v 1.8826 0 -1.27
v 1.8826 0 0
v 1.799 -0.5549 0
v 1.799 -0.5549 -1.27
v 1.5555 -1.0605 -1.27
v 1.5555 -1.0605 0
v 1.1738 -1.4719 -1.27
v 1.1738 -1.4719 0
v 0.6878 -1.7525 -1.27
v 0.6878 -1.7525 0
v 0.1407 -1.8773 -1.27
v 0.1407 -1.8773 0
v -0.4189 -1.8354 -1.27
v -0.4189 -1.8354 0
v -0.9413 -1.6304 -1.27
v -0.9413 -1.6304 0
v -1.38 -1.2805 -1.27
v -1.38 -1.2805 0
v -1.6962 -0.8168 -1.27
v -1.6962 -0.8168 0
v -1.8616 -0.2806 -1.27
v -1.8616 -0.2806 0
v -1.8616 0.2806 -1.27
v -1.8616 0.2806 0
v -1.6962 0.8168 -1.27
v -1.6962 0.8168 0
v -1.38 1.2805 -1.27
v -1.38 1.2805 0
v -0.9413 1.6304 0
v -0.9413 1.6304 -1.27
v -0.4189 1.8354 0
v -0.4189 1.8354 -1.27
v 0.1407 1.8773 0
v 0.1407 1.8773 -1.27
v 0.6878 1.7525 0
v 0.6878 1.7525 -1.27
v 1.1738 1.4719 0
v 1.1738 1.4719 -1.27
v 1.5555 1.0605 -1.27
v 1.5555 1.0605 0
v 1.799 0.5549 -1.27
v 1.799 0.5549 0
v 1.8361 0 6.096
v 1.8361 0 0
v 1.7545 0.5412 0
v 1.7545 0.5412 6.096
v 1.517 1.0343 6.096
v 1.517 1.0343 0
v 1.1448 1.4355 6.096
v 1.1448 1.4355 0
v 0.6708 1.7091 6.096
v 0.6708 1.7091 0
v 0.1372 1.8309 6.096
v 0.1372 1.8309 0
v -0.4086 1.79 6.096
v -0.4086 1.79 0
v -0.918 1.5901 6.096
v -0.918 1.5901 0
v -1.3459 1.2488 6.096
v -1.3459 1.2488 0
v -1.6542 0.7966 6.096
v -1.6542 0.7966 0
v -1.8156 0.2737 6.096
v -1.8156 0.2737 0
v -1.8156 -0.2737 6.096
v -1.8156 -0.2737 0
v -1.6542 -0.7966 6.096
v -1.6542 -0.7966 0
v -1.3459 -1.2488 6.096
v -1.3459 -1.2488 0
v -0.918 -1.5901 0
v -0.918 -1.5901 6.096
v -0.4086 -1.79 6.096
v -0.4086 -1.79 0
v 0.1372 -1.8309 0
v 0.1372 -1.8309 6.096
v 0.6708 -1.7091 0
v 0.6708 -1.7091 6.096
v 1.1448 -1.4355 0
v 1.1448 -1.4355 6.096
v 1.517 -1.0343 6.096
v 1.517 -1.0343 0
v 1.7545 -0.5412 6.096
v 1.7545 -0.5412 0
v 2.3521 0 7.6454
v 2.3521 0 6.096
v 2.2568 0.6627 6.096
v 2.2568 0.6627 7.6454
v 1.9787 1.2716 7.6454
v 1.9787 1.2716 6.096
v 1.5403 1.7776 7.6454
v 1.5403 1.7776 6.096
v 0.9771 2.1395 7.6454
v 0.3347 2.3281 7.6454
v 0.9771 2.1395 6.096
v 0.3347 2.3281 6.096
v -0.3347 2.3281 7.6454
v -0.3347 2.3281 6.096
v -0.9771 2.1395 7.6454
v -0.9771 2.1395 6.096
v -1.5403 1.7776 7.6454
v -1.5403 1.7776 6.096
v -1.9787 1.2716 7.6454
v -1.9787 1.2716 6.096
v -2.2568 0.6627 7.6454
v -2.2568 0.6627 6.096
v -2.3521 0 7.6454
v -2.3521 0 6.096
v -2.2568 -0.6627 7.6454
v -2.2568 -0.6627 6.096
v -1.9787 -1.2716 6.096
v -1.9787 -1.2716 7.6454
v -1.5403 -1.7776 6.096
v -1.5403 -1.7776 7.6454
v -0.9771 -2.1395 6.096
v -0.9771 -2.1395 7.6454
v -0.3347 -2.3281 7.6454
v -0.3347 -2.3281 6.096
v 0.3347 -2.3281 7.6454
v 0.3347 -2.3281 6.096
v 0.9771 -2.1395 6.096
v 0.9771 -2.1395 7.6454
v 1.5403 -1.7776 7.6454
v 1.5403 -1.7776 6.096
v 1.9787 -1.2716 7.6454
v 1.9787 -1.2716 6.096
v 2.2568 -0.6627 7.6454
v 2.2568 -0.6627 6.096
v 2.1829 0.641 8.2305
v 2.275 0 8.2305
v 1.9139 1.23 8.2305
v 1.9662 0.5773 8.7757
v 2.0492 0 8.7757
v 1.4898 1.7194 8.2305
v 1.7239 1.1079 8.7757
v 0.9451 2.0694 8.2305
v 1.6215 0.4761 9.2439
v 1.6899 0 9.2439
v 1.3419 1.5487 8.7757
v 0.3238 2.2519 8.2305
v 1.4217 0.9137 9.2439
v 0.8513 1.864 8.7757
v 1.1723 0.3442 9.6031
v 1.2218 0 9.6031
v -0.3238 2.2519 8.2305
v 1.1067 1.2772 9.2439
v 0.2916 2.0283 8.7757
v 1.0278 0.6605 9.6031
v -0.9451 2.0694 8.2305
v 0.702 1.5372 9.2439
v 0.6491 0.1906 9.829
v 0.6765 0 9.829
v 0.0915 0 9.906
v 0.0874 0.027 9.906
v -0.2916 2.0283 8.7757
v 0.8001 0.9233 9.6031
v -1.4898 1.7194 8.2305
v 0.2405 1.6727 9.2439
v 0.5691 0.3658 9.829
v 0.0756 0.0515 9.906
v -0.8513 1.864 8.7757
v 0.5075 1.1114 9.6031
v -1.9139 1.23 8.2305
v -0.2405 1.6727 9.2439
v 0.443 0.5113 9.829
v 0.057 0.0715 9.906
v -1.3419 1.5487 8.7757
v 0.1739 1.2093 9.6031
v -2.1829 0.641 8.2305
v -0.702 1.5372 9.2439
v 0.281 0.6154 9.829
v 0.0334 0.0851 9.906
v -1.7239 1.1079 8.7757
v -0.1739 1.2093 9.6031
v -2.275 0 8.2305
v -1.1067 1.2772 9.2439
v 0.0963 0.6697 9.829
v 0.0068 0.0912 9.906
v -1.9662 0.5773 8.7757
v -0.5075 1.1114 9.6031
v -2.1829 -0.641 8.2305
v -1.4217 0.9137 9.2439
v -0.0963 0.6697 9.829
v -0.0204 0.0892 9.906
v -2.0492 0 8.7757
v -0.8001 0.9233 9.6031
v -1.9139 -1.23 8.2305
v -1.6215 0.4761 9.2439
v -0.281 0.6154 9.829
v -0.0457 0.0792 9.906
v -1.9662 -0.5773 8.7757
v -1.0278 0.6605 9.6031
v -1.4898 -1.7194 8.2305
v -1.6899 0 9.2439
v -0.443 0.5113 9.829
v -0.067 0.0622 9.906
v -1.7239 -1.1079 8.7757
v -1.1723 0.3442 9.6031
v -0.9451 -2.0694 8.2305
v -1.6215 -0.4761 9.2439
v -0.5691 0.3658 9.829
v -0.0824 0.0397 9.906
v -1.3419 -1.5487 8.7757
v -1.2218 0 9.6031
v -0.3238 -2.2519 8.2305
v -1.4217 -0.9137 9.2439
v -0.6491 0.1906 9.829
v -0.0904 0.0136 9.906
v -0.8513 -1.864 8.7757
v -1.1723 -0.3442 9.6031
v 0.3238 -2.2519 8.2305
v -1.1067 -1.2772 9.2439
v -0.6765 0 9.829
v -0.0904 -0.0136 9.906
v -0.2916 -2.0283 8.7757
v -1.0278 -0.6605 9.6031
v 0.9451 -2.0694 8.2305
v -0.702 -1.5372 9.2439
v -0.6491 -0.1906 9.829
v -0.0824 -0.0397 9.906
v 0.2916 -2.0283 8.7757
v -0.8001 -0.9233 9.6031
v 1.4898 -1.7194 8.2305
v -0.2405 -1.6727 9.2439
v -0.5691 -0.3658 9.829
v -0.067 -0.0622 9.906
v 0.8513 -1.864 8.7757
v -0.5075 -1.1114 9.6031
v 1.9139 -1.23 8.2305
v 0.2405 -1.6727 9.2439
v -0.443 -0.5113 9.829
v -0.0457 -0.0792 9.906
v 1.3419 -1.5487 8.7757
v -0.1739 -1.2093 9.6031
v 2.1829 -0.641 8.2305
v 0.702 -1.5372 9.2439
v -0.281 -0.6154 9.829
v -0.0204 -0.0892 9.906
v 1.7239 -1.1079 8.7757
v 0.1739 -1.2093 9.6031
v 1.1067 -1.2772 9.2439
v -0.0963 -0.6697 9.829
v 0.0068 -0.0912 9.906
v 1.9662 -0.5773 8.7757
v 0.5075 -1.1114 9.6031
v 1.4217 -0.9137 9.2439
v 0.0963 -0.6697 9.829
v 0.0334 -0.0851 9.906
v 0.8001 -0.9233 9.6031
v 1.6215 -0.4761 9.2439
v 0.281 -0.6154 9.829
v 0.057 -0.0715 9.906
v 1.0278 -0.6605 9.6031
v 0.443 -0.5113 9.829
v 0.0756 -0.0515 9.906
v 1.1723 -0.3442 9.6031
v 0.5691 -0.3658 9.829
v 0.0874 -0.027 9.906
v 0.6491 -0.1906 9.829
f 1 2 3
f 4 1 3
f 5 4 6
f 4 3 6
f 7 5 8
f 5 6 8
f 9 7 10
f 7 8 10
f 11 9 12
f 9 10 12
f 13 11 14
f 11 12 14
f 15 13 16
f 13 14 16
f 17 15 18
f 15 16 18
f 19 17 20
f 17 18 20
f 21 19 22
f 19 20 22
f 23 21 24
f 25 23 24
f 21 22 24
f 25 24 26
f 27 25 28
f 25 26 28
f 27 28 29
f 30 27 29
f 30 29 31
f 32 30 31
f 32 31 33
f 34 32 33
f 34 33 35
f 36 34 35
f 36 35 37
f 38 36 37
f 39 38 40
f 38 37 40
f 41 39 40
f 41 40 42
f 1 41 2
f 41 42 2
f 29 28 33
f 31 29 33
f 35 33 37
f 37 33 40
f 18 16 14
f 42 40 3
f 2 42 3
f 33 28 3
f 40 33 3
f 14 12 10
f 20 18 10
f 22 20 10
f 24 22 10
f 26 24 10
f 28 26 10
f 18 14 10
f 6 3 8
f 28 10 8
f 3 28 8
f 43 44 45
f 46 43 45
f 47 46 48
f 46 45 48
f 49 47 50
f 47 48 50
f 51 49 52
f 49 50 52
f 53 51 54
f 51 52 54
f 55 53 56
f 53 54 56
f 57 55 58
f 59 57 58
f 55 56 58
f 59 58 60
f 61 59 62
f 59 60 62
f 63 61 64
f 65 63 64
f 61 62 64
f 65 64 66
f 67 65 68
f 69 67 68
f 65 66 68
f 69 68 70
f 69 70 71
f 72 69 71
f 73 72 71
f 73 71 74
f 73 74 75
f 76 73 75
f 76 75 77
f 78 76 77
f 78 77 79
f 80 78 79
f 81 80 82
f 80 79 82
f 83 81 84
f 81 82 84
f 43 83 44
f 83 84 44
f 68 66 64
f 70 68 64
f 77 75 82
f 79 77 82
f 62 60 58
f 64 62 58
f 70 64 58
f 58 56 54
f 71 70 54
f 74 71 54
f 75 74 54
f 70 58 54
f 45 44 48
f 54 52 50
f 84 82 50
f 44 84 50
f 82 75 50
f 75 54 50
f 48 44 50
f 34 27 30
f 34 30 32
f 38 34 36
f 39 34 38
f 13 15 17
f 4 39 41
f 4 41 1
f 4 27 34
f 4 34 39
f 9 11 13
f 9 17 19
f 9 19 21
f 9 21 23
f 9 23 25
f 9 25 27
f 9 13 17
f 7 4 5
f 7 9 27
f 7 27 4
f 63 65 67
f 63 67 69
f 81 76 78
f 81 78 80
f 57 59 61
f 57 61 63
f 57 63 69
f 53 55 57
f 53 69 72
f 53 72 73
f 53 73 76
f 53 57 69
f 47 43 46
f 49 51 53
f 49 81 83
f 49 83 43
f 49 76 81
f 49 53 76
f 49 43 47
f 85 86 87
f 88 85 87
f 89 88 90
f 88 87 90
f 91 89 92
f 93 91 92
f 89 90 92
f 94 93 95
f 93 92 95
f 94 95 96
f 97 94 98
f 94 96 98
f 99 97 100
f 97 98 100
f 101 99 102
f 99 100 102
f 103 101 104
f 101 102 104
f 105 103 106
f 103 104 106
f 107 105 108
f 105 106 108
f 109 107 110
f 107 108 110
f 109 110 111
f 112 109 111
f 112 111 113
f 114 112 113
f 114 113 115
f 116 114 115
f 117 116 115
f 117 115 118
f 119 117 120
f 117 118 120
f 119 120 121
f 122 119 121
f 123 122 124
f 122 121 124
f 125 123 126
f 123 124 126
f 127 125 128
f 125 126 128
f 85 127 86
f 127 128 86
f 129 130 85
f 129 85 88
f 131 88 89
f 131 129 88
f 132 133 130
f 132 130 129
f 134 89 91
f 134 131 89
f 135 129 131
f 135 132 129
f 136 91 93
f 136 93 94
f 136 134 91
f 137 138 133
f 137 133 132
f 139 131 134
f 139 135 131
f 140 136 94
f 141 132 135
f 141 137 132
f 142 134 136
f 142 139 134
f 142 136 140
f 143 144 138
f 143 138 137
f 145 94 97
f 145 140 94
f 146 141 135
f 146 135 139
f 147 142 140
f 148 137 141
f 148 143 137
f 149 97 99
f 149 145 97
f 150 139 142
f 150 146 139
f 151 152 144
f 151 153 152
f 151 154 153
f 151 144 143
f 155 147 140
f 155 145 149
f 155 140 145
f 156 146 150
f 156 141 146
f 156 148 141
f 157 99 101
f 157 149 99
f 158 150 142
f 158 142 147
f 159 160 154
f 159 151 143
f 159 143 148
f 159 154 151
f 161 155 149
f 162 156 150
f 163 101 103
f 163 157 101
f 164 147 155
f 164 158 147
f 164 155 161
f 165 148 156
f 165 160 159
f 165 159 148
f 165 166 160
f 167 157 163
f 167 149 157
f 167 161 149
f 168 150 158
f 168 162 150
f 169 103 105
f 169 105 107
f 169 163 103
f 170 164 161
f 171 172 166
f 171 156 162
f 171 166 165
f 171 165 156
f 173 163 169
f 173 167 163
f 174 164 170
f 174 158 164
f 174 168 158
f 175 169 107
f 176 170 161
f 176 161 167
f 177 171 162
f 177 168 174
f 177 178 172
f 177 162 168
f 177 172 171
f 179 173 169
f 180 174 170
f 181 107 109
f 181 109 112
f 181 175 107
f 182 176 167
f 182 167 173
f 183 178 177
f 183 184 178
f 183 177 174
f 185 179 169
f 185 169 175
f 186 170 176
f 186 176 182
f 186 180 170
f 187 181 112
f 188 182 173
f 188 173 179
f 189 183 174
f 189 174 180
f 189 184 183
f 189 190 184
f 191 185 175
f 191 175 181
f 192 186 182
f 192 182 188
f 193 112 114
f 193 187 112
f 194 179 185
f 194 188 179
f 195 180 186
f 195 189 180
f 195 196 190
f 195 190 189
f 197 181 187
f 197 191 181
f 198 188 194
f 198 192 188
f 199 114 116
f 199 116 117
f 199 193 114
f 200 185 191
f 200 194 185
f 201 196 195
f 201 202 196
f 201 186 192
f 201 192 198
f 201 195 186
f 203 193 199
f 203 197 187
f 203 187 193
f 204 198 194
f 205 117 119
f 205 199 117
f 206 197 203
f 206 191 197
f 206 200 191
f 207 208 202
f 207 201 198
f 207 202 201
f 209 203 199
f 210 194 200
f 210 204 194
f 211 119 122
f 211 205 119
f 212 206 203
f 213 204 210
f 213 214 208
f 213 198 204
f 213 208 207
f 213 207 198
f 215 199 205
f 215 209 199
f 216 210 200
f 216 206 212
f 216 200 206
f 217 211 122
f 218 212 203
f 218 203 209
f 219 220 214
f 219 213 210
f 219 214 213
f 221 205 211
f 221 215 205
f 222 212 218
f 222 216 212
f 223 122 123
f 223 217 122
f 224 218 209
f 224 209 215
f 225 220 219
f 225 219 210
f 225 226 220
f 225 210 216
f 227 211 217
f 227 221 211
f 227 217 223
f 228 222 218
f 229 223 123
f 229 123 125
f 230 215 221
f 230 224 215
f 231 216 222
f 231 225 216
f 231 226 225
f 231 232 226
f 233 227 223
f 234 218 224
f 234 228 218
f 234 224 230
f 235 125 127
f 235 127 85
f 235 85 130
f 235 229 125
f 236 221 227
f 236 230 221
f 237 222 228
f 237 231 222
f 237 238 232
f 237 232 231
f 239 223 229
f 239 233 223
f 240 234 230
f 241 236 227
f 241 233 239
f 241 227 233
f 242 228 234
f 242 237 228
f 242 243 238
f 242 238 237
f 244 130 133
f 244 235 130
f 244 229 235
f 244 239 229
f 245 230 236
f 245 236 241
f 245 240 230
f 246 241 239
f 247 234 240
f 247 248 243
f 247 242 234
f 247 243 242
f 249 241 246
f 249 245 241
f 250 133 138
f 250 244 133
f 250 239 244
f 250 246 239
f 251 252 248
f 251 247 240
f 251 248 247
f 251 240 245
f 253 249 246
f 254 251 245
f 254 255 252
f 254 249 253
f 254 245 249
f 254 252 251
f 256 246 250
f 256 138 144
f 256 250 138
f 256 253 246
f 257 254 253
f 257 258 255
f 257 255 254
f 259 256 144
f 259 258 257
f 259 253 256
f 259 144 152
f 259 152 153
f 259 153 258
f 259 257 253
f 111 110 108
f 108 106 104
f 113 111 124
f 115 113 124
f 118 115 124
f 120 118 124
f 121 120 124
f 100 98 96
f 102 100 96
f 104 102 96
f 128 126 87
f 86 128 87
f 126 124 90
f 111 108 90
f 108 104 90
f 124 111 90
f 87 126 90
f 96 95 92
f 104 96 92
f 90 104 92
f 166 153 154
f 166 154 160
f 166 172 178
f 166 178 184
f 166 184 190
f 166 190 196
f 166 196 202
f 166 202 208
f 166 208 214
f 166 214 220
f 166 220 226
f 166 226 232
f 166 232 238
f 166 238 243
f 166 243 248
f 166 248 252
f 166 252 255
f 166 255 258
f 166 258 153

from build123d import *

# Parameters (mm, degrees)
F0_R     = 1.8360694956
F1_DEPTH = 6.096
F2_R     = 2.3520596952
F2_R_2   = 1.8360694956
F3_DEPTH = 3.81
F4_R     = 2.2606
F5_R     = 1.8826071484
F5_R_2   = 1.8360694956
F6_DEPTH = 1.27


with BuildPart() as f1:
    # F0 (on Top) → F1 (new body)
    with BuildSketch(Plane.XY):
        Circle(F0_R)
    extrude(amount=F1_DEPTH)


with BuildPart() as f3:
    # F2 (on face) → F3 (new body)
    with BuildSketch(Plane.XY.offset(6.096)):
        Circle(F2_R)
        Circle(F2_R_2, mode=Mode.SUBTRACT)
        Circle(F2_R_2)
    extrude(amount=F3_DEPTH)

    # F4
    f4_edges = [f3.edges().sort_by_distance(p)[0] for p in [
        (-2.35206, 0, 9.906),
    ]]
    fillet(f4_edges, radius=F4_R)


with BuildPart() as f6:
    # F5 (on face) → F6 (new body)
    with BuildSketch(Plane(origin=(0, 0, 0), x_dir=(1, 0, 0), z_dir=(0, 0, -1))):
        Circle(F5_R)
        Circle(F5_R_2, mode=Mode.SUBTRACT)
        Circle(F5_R_2)
    extrude(amount=F6_DEPTH)


solid = Compound([f1.part, f3.part, f6.part])
